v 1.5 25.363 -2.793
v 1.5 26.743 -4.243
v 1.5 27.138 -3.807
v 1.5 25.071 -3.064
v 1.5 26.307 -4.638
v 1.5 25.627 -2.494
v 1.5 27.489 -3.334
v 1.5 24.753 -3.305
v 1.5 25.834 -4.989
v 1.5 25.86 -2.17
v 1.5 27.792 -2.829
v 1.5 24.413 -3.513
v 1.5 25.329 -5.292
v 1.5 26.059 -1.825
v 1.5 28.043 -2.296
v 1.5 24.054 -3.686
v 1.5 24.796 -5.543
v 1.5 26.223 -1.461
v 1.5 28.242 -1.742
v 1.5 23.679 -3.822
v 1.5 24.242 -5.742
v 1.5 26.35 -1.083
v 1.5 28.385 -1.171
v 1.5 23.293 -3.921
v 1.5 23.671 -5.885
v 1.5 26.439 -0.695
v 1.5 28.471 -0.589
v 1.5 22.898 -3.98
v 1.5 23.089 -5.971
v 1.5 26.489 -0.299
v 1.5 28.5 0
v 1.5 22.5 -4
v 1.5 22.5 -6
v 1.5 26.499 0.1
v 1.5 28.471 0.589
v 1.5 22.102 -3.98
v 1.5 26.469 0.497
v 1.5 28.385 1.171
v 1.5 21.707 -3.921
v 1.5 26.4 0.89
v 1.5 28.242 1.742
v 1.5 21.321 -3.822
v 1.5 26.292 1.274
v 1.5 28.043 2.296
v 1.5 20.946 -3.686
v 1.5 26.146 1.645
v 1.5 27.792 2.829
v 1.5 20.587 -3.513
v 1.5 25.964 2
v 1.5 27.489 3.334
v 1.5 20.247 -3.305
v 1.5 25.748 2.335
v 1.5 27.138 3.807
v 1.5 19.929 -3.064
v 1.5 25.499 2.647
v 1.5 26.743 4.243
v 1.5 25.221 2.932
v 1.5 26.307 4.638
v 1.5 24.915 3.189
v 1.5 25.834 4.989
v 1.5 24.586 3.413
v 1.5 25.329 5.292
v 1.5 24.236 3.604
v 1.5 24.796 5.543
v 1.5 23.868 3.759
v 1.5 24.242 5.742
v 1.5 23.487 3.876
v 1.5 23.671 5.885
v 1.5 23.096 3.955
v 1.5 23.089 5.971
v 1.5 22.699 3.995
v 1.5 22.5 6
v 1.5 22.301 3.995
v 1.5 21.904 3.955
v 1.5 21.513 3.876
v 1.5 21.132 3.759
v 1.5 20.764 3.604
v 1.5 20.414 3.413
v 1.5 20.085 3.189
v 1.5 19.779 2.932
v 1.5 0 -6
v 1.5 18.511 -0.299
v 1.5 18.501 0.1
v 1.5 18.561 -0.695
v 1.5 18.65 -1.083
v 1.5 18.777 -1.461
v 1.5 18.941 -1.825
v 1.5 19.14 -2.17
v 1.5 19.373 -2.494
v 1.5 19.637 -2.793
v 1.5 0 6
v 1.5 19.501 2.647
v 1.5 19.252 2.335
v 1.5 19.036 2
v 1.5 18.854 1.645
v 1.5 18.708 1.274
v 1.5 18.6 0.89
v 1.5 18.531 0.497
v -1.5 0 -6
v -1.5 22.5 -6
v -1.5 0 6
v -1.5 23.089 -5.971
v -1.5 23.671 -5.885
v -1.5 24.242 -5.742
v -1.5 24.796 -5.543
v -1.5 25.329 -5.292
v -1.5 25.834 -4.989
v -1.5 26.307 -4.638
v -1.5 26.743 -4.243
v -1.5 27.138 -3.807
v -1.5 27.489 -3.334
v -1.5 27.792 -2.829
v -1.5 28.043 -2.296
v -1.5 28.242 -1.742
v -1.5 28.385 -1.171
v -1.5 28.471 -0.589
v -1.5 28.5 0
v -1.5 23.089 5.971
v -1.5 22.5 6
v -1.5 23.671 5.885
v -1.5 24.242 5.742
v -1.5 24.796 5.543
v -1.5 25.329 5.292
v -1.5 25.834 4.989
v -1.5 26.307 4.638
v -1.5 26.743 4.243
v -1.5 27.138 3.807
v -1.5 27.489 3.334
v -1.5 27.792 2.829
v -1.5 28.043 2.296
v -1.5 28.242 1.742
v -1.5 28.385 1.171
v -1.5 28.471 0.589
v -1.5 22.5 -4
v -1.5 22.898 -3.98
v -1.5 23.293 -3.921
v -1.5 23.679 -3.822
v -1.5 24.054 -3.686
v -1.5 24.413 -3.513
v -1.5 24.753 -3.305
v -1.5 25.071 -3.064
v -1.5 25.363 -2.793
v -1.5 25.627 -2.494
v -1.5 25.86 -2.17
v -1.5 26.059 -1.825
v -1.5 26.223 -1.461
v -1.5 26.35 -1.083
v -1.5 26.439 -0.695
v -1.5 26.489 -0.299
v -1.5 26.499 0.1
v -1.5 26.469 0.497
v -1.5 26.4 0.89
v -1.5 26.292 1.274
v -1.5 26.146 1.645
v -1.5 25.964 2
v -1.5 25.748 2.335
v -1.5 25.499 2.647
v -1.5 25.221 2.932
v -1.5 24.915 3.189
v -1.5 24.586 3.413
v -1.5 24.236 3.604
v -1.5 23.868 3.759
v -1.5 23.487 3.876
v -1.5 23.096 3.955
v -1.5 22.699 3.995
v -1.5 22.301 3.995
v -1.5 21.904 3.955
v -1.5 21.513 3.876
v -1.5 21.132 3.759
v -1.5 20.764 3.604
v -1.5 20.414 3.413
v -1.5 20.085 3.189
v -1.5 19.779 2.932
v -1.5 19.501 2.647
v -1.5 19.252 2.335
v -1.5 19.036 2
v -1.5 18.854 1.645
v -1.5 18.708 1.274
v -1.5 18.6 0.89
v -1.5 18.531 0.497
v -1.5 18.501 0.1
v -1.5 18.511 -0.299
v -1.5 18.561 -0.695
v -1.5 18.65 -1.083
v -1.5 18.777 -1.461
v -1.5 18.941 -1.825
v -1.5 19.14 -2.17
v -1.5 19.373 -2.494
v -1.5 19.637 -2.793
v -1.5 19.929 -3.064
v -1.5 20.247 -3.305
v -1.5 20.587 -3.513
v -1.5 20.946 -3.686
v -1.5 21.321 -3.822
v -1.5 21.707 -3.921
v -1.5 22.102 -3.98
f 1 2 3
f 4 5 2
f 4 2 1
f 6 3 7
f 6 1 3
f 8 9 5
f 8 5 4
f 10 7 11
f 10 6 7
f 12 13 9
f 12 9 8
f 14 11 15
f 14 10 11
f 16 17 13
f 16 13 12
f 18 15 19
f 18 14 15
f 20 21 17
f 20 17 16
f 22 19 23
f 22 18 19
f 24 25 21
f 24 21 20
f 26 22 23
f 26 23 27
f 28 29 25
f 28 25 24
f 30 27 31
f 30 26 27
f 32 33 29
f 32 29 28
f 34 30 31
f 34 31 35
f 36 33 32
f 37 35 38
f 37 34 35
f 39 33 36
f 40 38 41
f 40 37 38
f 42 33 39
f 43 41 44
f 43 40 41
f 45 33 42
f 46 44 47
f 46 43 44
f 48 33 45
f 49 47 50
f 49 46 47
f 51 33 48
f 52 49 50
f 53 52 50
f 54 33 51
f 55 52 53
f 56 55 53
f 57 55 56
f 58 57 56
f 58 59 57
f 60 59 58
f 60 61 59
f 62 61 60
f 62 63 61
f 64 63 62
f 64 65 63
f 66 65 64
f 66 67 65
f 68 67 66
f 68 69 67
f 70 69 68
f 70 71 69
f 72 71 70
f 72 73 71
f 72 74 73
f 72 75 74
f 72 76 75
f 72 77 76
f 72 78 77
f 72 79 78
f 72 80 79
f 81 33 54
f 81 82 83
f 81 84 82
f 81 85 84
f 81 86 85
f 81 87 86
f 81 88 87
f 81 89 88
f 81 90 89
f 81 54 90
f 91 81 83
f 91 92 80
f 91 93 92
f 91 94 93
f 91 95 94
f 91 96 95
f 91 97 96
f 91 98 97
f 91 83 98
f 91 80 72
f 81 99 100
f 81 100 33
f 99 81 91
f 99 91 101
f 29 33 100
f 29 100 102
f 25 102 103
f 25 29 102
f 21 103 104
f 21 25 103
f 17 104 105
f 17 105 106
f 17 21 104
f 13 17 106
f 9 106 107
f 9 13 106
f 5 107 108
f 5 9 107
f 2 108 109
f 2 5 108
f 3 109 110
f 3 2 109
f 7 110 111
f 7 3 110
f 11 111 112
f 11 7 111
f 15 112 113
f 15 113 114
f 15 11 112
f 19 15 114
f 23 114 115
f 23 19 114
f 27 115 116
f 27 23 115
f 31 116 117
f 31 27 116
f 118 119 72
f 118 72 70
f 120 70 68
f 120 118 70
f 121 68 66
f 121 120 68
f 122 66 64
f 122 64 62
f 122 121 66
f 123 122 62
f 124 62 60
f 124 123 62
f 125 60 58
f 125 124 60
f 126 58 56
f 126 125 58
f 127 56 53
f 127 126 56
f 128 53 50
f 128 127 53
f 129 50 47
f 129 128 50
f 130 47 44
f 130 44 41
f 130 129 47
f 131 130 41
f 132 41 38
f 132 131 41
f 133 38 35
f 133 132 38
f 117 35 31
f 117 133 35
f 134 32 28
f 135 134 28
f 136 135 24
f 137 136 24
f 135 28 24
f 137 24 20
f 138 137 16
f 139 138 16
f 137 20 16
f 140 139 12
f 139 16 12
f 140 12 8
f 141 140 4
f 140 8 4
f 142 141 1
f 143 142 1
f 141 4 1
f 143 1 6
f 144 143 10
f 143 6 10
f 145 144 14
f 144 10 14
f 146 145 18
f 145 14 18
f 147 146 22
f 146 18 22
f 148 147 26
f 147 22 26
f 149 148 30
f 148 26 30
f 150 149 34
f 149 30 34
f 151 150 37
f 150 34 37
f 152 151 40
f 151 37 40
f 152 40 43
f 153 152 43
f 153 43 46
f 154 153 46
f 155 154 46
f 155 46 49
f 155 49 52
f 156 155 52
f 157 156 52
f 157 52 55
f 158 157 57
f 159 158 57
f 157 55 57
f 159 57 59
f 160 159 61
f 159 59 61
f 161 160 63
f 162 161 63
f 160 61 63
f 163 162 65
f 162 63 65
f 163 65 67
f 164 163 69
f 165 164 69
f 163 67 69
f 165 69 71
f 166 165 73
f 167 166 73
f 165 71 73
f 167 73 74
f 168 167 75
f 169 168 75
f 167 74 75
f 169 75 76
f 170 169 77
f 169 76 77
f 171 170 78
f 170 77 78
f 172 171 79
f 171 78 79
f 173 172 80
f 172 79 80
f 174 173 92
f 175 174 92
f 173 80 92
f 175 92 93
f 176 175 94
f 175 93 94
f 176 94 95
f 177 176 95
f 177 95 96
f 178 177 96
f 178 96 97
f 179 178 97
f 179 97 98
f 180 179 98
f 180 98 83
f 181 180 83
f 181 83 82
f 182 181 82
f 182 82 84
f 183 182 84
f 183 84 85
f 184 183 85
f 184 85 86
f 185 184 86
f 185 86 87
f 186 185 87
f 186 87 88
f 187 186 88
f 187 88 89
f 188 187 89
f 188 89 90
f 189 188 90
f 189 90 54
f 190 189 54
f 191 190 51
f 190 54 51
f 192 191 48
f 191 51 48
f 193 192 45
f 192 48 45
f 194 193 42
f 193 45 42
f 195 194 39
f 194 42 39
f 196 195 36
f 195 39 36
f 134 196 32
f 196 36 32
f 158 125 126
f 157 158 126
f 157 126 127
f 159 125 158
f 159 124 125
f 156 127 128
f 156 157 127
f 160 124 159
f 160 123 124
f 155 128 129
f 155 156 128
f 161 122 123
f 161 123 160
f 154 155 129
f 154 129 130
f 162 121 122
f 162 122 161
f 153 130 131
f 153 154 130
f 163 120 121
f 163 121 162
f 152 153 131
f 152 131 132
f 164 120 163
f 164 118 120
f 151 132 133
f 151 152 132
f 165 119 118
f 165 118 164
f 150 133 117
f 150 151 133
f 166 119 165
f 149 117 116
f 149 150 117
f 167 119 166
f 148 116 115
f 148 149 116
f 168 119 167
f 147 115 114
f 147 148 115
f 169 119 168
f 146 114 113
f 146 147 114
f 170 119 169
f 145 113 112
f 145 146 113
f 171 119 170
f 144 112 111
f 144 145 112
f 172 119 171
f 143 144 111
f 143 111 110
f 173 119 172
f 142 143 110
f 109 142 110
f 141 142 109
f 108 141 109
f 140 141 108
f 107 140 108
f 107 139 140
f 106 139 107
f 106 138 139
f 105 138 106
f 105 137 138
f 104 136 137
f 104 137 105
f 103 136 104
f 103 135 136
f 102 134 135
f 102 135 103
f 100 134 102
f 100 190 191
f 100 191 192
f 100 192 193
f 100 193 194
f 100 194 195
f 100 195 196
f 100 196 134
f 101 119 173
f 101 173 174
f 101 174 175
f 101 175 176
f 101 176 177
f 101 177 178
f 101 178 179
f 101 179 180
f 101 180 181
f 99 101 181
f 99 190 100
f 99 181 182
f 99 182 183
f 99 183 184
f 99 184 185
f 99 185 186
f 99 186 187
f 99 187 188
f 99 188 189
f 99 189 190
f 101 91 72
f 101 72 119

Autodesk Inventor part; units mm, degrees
ref_plane "YZ Plane" through (0, 0, 0) normal (1, 0, 0) x (0, 1, 0)
ref_plane "XZ Plane" through (0, 0, 0) normal (0, 1, 0) x (-1, 0, 0)
ref_plane "XY Plane" through (0, 0, 0) normal (0, 0, 1) x (1, 0, 0)
sketch "Sketch1" plane through (0, 0, 0) normal (0, 1, 0) x (-1, 0, 0)
  line L0 (-1.5, 6) -> (1.5, 6)
  line L1 (1.5, 6) -> (1.5, -6)
  line L2 (1.5, -6) -> (-1.5, -6)
  line L3 (-1.5, -6) -> (-1.5, 6)
  line L4 (-1.5, 6) -> (1.5, -6) construction
  line L5 (1.5, 6) -> (-1.5, -6) construction
  point P0 (0, 0)
  dimension "d0" = 3
  dimension "d1" = 12
extrude "Extrusion1" add sketch "Sketch1" along normal blind 28.5
fillet "Fillet1" radius 6 2 edges at (0, 28.5, 6) (0, 28.5, -6)
sketch "Sketch4" plane through (1.5, 0, 6) normal (1, 0, 0) x (0, 0, -1)
  arc A0 (12, 22.5) -> (0, 22.5) centre (6, 22.5) ccw projected
  circle A1 centre (6, 22.5) radius 4
  point P0 (6, 0)
  dimension "d14" = 8
extrude "Extrusion4" cut sketch "Sketch4" against normal through all
properties part number "middleLegv2-1_3DPrint"
